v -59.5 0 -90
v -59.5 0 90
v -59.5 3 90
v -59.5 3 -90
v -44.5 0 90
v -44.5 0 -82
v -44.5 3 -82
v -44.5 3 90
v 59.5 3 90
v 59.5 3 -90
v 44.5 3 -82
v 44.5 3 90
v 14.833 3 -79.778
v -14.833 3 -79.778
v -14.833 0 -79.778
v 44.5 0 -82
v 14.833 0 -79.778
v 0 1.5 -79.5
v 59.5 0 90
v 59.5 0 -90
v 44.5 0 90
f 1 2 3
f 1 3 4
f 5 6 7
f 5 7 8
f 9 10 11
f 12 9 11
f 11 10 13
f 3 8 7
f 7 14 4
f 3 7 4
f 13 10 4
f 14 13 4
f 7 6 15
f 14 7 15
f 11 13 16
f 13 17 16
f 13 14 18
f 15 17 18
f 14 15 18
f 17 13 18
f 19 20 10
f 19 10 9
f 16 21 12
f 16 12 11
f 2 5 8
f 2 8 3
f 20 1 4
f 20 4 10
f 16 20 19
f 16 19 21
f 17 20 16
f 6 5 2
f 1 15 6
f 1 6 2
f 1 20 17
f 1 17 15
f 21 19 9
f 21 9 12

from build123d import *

# Parameters (mm, degrees)
BOSS_EXTRUDE1_DEPTH = 3


with BuildPart() as part:
    # Sketch1 → Boss-Extrude1 (new body)
    with BuildSketch(Plane(origin=(0, 0, 0), x_dir=(1, 0, 0), z_dir=(0, 1, 0))):
        with BuildLine():
            Line((-59.5, -90), (-59.5, 90))
            Line((-59.5, 90), (59.5, 90))
            Line((59.5, 90), (59.5, -90))
            Line((59.5, -90), (44.5, -90))
            Line((44.5, -90), (44.5, 82))
            add(Edge.make_bspline(
                [(-44.5, 82), (0, 77), (44.5, 82)],
                knots=[0, 0, 0, 1, 1, 1], degree=2))
            Line((-44.5, 82), (-44.5, -90))
            Line((-44.5, -90), (-59.5, -90))
        make_face()
    extrude(amount=BOSS_EXTRUDE1_DEPTH)


solid = part.part
